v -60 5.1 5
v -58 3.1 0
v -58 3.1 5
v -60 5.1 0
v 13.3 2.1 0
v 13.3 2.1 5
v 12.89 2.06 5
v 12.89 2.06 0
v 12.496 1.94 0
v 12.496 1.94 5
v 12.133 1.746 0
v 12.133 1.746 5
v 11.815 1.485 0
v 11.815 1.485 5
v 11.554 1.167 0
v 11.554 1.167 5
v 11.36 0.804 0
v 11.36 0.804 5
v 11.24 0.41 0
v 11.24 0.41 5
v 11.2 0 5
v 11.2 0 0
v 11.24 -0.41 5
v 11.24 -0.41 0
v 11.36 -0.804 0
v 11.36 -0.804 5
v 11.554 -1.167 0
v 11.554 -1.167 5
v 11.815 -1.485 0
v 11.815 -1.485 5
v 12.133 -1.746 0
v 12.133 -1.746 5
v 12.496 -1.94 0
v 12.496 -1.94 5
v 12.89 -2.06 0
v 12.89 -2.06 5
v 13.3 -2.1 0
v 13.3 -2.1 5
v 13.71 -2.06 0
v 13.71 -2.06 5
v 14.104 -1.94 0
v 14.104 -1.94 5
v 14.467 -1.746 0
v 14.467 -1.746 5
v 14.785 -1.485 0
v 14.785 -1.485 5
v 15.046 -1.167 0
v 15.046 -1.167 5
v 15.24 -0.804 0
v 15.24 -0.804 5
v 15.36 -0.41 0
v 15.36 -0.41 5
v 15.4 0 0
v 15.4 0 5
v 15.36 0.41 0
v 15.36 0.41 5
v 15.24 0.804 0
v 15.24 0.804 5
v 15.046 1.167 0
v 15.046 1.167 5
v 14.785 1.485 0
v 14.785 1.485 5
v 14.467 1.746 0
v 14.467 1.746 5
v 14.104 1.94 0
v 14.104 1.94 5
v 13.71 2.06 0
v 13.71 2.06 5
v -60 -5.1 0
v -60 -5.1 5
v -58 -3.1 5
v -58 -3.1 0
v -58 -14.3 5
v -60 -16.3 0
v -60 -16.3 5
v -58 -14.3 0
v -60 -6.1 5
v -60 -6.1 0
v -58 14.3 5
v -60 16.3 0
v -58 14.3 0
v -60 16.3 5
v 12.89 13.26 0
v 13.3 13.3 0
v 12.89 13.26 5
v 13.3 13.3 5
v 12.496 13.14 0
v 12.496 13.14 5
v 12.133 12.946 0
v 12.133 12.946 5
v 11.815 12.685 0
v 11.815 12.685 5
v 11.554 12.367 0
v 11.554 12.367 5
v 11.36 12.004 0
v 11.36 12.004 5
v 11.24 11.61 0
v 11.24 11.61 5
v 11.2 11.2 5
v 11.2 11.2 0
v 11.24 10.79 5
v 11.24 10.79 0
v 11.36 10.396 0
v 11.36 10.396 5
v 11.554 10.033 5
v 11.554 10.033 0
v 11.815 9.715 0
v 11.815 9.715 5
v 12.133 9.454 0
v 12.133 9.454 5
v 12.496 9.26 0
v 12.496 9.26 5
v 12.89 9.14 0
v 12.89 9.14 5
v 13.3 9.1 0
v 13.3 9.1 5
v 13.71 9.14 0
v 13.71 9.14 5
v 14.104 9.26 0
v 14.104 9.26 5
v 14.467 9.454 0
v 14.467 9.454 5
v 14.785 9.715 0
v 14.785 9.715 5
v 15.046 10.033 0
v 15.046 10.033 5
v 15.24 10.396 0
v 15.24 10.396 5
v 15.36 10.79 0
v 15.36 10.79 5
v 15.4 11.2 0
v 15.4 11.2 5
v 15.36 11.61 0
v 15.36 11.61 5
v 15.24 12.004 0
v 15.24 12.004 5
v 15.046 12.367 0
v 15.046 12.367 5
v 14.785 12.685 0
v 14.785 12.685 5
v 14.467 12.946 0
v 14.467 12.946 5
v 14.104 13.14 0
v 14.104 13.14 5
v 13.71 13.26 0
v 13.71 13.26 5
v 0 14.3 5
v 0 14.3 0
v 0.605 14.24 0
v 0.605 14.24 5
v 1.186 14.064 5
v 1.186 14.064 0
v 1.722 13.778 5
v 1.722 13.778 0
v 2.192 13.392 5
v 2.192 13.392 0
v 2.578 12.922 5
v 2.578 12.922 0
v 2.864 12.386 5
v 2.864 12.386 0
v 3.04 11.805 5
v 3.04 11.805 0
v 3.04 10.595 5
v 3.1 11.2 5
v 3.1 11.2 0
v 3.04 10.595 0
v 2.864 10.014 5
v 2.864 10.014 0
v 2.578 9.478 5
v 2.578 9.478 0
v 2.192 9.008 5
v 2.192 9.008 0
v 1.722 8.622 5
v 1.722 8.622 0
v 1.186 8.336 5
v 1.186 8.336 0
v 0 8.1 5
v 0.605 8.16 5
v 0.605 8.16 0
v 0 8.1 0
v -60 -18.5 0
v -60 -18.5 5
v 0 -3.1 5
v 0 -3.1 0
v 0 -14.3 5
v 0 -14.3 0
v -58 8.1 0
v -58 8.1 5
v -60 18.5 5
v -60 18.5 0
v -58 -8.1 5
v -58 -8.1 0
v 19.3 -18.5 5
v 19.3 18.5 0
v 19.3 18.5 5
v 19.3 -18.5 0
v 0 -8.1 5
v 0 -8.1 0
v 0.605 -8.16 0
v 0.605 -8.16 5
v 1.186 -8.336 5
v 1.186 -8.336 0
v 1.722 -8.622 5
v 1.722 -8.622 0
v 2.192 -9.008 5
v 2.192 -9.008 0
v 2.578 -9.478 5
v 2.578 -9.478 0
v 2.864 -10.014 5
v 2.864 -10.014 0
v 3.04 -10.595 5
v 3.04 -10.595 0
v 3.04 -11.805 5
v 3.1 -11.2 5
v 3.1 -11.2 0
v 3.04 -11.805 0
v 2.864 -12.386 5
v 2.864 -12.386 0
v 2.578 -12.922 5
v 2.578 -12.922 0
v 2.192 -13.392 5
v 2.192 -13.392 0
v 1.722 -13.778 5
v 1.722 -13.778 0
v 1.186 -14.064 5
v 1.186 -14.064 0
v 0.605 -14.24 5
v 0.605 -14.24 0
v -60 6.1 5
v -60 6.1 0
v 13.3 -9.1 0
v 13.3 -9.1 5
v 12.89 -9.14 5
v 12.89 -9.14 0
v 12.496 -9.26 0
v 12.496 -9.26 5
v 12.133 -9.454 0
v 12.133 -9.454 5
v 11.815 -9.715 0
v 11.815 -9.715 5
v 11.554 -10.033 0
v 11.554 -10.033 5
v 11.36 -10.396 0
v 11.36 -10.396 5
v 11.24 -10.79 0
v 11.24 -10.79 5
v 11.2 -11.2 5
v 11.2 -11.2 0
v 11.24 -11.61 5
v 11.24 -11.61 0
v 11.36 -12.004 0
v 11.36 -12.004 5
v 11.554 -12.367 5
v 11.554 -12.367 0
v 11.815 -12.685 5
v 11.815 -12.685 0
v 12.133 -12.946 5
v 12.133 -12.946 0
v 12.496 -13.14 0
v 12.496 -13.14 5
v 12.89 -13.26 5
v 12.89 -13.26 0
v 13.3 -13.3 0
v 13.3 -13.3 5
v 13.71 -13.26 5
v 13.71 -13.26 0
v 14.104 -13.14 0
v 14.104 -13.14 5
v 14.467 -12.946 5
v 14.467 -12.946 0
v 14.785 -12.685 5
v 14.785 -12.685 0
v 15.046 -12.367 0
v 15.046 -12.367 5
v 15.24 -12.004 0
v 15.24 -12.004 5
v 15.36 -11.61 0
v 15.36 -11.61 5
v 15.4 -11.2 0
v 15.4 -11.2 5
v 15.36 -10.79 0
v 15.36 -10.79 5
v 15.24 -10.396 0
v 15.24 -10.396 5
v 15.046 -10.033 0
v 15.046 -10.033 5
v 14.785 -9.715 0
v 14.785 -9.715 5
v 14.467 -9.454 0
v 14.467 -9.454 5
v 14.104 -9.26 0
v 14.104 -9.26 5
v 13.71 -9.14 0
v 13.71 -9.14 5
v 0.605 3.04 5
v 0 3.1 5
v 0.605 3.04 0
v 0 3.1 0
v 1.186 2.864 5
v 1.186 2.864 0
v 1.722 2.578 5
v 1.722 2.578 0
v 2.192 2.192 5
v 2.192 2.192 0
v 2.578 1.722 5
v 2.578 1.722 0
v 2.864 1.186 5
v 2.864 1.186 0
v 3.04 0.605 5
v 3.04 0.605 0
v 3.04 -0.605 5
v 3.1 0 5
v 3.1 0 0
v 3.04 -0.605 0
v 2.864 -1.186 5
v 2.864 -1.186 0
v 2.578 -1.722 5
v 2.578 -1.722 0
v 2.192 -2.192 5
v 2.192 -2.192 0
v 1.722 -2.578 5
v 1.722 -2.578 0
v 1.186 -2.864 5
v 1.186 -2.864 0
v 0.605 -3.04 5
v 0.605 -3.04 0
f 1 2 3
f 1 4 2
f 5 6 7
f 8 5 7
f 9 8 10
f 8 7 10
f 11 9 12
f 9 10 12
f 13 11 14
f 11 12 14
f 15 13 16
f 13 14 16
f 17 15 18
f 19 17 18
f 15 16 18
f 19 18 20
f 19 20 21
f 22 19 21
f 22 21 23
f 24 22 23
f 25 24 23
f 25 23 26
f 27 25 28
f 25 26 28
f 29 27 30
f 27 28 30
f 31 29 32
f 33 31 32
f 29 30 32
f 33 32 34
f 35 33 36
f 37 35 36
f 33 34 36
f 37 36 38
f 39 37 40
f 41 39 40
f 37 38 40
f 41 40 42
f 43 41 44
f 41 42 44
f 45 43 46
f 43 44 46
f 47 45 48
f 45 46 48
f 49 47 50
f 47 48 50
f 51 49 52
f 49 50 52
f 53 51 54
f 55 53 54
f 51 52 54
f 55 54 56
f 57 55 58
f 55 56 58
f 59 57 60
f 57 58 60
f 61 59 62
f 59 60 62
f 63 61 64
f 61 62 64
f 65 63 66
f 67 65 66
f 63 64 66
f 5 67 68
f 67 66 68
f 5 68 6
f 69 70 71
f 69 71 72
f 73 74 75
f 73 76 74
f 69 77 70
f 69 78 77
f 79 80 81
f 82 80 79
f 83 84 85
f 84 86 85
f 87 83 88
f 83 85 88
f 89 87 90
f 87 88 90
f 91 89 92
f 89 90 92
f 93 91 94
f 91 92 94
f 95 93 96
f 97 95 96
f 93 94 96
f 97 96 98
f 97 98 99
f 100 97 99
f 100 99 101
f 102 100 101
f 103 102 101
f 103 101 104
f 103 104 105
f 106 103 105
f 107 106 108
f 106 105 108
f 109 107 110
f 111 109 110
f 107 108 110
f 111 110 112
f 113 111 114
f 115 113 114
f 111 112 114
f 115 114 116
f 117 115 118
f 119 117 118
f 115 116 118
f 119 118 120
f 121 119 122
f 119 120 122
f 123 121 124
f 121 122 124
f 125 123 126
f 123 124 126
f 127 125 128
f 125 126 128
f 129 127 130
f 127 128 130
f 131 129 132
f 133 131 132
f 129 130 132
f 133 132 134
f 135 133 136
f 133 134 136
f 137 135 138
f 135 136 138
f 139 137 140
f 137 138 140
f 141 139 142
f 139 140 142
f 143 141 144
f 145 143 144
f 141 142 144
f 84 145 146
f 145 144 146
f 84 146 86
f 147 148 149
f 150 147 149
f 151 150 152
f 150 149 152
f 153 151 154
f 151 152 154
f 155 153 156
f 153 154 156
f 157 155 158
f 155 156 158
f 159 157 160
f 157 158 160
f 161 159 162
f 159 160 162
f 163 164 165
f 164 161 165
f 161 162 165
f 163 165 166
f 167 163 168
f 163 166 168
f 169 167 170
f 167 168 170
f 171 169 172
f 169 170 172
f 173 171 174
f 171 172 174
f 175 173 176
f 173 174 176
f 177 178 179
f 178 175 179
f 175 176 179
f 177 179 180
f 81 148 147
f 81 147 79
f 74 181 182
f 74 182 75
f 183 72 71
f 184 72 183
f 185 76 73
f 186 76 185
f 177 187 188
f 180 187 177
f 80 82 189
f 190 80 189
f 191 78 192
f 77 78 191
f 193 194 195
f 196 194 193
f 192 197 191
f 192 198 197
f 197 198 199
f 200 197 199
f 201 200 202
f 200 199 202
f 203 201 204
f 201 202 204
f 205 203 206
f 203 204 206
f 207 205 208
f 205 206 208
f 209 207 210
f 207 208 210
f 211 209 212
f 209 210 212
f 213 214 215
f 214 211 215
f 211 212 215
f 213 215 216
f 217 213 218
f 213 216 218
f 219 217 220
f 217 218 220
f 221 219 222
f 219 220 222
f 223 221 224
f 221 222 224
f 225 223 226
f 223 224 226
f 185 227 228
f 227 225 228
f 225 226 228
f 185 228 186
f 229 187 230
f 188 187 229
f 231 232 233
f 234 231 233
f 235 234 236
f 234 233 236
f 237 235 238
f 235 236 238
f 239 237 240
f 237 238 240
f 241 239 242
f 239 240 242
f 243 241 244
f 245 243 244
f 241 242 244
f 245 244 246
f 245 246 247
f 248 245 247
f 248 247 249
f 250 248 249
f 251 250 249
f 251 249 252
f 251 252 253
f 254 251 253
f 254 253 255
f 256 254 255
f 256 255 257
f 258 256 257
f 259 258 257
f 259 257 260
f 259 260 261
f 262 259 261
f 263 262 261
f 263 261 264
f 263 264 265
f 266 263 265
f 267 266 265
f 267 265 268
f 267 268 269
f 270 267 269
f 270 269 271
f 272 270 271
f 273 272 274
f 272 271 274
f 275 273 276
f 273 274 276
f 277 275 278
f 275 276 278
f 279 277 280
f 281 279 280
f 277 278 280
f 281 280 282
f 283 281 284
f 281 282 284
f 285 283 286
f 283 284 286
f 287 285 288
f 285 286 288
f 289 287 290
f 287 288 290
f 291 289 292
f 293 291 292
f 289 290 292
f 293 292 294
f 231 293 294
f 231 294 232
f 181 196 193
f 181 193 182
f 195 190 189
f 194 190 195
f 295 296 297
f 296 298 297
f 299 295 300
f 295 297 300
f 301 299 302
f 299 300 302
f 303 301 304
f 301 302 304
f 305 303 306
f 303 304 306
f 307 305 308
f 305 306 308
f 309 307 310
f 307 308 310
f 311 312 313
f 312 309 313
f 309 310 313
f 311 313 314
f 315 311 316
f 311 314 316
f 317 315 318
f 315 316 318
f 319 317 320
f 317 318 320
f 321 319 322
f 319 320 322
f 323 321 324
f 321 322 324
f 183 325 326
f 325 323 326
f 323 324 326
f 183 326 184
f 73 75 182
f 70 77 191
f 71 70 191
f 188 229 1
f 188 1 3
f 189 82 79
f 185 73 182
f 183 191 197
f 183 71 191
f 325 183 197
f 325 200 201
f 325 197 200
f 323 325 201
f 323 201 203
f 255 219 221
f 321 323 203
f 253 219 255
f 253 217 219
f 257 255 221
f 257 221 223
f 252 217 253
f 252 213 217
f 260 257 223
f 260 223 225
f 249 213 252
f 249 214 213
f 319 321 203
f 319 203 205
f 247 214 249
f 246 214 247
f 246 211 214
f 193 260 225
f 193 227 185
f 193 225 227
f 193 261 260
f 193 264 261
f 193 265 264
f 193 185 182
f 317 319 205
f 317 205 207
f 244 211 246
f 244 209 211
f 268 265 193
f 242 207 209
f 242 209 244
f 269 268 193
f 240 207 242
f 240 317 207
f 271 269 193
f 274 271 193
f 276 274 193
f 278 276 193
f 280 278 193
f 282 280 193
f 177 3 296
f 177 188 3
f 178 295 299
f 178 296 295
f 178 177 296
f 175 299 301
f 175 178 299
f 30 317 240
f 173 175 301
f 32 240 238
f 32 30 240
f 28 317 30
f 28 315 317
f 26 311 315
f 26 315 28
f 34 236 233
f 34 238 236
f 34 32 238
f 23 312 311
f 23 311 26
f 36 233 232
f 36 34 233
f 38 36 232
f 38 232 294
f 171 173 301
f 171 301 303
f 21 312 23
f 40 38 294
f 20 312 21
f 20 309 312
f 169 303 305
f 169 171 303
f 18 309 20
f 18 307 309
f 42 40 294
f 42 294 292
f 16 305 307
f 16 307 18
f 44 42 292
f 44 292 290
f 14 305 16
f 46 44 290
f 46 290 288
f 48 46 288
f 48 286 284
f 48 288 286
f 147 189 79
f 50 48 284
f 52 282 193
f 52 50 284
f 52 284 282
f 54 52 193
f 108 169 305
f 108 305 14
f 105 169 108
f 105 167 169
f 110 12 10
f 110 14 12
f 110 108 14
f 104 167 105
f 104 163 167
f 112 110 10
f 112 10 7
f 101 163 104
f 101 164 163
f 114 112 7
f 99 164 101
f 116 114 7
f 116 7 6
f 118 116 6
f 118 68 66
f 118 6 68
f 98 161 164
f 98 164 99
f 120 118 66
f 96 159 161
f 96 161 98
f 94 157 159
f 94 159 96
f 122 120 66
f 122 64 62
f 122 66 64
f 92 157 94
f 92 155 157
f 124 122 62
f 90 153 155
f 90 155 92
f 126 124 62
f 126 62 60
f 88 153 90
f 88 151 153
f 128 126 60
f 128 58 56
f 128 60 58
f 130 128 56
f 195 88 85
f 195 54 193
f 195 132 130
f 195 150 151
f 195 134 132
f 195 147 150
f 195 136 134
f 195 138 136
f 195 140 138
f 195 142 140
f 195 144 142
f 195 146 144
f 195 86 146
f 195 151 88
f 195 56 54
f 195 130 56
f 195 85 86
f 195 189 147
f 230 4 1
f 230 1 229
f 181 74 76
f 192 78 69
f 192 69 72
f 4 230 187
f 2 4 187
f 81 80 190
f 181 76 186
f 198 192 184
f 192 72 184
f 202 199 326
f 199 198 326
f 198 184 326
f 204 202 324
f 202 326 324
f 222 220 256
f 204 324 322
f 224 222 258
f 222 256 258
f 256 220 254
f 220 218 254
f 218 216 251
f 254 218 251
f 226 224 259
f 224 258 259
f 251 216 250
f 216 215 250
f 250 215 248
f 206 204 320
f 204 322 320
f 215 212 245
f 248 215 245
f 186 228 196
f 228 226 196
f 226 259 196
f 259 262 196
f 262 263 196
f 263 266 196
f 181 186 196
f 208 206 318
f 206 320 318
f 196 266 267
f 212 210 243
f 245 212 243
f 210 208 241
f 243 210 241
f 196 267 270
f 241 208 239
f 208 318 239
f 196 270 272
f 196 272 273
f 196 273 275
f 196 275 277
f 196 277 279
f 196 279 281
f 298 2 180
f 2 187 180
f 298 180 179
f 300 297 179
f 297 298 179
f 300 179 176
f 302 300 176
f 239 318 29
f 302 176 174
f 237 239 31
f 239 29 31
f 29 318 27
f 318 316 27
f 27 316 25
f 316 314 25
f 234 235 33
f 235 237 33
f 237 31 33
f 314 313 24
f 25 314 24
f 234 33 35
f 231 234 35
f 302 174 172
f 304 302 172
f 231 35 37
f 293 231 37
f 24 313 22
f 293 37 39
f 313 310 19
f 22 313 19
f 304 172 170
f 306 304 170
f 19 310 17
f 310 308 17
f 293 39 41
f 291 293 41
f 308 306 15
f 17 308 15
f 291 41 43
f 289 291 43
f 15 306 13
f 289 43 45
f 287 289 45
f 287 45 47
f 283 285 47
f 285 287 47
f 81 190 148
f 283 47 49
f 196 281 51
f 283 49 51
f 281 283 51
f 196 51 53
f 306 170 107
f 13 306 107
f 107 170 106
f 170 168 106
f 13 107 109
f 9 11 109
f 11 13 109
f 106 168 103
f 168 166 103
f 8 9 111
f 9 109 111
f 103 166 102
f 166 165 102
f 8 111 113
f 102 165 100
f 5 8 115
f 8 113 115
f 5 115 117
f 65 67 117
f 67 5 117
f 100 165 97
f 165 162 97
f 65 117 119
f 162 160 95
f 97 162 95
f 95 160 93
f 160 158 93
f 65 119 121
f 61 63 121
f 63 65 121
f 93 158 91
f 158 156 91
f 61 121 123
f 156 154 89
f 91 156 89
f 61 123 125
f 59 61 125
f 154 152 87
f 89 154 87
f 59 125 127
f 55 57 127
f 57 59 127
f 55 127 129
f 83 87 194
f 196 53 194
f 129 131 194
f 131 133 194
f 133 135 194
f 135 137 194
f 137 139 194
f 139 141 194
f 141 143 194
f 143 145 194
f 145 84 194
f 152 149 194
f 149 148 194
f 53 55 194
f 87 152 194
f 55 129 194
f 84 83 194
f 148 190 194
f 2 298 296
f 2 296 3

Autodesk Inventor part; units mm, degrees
ref_plane "YZ Plane" through (0, 0, 0) normal (1, 0, 0) x (0, 1, 0)
ref_plane "XZ Plane" through (0, 0, 0) normal (0, 1, 0) x (-1, 0, 0)
ref_plane "XY Plane" through (0, 0, 0) normal (0, 0, 1) x (1, 0, 0)
sketch "Sketch1" plane through (0, 0, 0) normal (0, 0, 1) x (1, 0, 0)
  line L0 (0, 0) -> (-60, 0) construction
  line L1 (0, 3.1) -> (-60, 3.1)
  line L2 (-60, -3.1) -> (0, -3.1)
  arc A0 (0, -3.1) -> (0, 3.1) centre (0, 0) ccw
  arc A1 (-60, 3.1) -> (-60, -3.1) centre (-60, 0) ccw
  line L3 (0, 11.2) -> (-60, 11.2) construction
  line L4 (0, 14.3) -> (-60, 14.3)
  line L5 (-60, 8.1) -> (0, 8.1)
  arc A2 (0, 8.1) -> (0, 14.3) centre (0, 11.2) ccw
  arc A3 (-60, 14.3) -> (-60, 8.1) centre (-60, 11.2) ccw
  line L6 (0, -11.2) -> (-60, -11.2) construction
  line L7 (0, -8.1) -> (-60, -8.1)
  line L8 (-60, -14.3) -> (0, -14.3)
  arc A4 (0, -14.3) -> (0, -8.1) centre (0, -11.2) ccw
  arc A5 (-60, -8.1) -> (-60, -14.3) centre (-60, -11.2) ccw
  line L9 (7.3, -3.9) -> (-7.3, -3.9) construction
  line L10 (-7.3, -3.9) -> (-7.3, -18.5) construction
  line L11 (-7.3, -18.5) -> (7.3, -18.5) construction
  line L12 (7.3, -18.5) -> (7.3, -3.9) construction
  line L13 (7.3, 3.9) -> (-7.3, 3.9) construction
  line L14 (-7.3, 3.9) -> (-7.3, 18.5) construction
  line L15 (-7.3, 18.5) -> (7.3, 18.5) construction
  line L16 (7.3, 18.5) -> (7.3, 3.9) construction
  line L17 (-7.3, -3.9) -> (7.3, -18.5) construction
  line L18 (7.3, -3.9) -> (-7.3, -18.5) construction
  line L19 (-7.3, 18.5) -> (7.3, 3.9) construction
  line L20 (7.3, 18.5) -> (-7.3, 3.9) construction
  line L21 (0, -25.9) -> (0, 25.9) construction
  line L22 (-60, 18.5) -> (7.3, 18.5)
  line L23 (7.3, 18.5) -> (7.3, -18.5)
  line L24 (7.3, -18.5) -> (-60, -18.5)
  line L25 (-60, -18.5) -> (-60, 18.5)
  line L26 (7.3, 18.5) -> (19.3, 18.5)
  line L27 (19.3, 18.5) -> (19.3, -18.5)
  line L28 (19.3, -18.5) -> (7.3, -18.5)
  line L29 (7.3, -18.5) -> (7.3, 18.5)
  point P0 (-30, 0)
  point P1 (-30, 11.2)
  point P2 (-30, -11.2)
  point P3 (0, -11.2)
  dimension "d0" = 6.2
  dimension "d1" = 14.6
  dimension "d2" = 14.6
  dimension "d5" = 60
  dimension "d11" = 11.2
  dimension "d12" = 5
  dimension "d13" = 5
  dimension "d17" = 37
  dimension "d18" = 12
extrude "Extrusion1" add sketch "Sketch1" along normal blind 5 contours L1 L25 L5 A2 L4 L22 L23 L24 L8 A4 L7 L2 A0 | L26 L27 L28 L23
chamfer "Chamfer1" distance 2 angle 45 6 edges at (-60, 14.3, 2.5) (-60, 8.1, 2.5) (-60, 3.1, 2.5) (-60, -3.1, 2.5) (-60, -8.1, 2.5) (-60, -14.3, 2.5)
sketch "Sketch3" plane through (0, 0, 0) normal (0, 0, -1) x (-1, 0, 0)
  line L0 (-19.3, 18.5) -> (-7.3, 18.5) construction
  line L1 (-7.3, 18.5) -> (-7.3, -18.5) construction
  line L2 (-7.3, -18.5) -> (-19.3, -18.5) construction
  line L3 (-19.3, -18.5) -> (-19.3, 18.5) construction
  line L4 (60, -18.5) -> (-19.3, -18.5) construction
  line L5 (-19.3, 18.5) -> (60, 18.5) construction
  line L6 (-13.3, 18.5) -> (-13.3, -18.5) construction
  line L7 (60, -18.5) -> (-19.3, -18.5) construction
  line L8 (75.86, 0) -> (-35.16, 0) construction
  point P0 (0, 0)
  point P1 (-13.3, 11.2)
  point P2 (-13.3, -11.2)
  point P3 (-13.3, 0)
  dimension "d19" = 12
  dimension "d20" = 6
  dimension "d21" = 22.4
  dimension "d22" = 37
hole "Hole1" at (13.3, 11.2, 0) at (13.3, -11.2, 0) at (13.3, 0, 0) direction (0, 0, 1) diameter 4.2 end through all
equation "\"d2\" = d1"
equation "\"d13\" = d12"
equation "\"d20\" = 0.5 * d19"
properties part number "SampleMountFingers" material "Aluminum 6061"
